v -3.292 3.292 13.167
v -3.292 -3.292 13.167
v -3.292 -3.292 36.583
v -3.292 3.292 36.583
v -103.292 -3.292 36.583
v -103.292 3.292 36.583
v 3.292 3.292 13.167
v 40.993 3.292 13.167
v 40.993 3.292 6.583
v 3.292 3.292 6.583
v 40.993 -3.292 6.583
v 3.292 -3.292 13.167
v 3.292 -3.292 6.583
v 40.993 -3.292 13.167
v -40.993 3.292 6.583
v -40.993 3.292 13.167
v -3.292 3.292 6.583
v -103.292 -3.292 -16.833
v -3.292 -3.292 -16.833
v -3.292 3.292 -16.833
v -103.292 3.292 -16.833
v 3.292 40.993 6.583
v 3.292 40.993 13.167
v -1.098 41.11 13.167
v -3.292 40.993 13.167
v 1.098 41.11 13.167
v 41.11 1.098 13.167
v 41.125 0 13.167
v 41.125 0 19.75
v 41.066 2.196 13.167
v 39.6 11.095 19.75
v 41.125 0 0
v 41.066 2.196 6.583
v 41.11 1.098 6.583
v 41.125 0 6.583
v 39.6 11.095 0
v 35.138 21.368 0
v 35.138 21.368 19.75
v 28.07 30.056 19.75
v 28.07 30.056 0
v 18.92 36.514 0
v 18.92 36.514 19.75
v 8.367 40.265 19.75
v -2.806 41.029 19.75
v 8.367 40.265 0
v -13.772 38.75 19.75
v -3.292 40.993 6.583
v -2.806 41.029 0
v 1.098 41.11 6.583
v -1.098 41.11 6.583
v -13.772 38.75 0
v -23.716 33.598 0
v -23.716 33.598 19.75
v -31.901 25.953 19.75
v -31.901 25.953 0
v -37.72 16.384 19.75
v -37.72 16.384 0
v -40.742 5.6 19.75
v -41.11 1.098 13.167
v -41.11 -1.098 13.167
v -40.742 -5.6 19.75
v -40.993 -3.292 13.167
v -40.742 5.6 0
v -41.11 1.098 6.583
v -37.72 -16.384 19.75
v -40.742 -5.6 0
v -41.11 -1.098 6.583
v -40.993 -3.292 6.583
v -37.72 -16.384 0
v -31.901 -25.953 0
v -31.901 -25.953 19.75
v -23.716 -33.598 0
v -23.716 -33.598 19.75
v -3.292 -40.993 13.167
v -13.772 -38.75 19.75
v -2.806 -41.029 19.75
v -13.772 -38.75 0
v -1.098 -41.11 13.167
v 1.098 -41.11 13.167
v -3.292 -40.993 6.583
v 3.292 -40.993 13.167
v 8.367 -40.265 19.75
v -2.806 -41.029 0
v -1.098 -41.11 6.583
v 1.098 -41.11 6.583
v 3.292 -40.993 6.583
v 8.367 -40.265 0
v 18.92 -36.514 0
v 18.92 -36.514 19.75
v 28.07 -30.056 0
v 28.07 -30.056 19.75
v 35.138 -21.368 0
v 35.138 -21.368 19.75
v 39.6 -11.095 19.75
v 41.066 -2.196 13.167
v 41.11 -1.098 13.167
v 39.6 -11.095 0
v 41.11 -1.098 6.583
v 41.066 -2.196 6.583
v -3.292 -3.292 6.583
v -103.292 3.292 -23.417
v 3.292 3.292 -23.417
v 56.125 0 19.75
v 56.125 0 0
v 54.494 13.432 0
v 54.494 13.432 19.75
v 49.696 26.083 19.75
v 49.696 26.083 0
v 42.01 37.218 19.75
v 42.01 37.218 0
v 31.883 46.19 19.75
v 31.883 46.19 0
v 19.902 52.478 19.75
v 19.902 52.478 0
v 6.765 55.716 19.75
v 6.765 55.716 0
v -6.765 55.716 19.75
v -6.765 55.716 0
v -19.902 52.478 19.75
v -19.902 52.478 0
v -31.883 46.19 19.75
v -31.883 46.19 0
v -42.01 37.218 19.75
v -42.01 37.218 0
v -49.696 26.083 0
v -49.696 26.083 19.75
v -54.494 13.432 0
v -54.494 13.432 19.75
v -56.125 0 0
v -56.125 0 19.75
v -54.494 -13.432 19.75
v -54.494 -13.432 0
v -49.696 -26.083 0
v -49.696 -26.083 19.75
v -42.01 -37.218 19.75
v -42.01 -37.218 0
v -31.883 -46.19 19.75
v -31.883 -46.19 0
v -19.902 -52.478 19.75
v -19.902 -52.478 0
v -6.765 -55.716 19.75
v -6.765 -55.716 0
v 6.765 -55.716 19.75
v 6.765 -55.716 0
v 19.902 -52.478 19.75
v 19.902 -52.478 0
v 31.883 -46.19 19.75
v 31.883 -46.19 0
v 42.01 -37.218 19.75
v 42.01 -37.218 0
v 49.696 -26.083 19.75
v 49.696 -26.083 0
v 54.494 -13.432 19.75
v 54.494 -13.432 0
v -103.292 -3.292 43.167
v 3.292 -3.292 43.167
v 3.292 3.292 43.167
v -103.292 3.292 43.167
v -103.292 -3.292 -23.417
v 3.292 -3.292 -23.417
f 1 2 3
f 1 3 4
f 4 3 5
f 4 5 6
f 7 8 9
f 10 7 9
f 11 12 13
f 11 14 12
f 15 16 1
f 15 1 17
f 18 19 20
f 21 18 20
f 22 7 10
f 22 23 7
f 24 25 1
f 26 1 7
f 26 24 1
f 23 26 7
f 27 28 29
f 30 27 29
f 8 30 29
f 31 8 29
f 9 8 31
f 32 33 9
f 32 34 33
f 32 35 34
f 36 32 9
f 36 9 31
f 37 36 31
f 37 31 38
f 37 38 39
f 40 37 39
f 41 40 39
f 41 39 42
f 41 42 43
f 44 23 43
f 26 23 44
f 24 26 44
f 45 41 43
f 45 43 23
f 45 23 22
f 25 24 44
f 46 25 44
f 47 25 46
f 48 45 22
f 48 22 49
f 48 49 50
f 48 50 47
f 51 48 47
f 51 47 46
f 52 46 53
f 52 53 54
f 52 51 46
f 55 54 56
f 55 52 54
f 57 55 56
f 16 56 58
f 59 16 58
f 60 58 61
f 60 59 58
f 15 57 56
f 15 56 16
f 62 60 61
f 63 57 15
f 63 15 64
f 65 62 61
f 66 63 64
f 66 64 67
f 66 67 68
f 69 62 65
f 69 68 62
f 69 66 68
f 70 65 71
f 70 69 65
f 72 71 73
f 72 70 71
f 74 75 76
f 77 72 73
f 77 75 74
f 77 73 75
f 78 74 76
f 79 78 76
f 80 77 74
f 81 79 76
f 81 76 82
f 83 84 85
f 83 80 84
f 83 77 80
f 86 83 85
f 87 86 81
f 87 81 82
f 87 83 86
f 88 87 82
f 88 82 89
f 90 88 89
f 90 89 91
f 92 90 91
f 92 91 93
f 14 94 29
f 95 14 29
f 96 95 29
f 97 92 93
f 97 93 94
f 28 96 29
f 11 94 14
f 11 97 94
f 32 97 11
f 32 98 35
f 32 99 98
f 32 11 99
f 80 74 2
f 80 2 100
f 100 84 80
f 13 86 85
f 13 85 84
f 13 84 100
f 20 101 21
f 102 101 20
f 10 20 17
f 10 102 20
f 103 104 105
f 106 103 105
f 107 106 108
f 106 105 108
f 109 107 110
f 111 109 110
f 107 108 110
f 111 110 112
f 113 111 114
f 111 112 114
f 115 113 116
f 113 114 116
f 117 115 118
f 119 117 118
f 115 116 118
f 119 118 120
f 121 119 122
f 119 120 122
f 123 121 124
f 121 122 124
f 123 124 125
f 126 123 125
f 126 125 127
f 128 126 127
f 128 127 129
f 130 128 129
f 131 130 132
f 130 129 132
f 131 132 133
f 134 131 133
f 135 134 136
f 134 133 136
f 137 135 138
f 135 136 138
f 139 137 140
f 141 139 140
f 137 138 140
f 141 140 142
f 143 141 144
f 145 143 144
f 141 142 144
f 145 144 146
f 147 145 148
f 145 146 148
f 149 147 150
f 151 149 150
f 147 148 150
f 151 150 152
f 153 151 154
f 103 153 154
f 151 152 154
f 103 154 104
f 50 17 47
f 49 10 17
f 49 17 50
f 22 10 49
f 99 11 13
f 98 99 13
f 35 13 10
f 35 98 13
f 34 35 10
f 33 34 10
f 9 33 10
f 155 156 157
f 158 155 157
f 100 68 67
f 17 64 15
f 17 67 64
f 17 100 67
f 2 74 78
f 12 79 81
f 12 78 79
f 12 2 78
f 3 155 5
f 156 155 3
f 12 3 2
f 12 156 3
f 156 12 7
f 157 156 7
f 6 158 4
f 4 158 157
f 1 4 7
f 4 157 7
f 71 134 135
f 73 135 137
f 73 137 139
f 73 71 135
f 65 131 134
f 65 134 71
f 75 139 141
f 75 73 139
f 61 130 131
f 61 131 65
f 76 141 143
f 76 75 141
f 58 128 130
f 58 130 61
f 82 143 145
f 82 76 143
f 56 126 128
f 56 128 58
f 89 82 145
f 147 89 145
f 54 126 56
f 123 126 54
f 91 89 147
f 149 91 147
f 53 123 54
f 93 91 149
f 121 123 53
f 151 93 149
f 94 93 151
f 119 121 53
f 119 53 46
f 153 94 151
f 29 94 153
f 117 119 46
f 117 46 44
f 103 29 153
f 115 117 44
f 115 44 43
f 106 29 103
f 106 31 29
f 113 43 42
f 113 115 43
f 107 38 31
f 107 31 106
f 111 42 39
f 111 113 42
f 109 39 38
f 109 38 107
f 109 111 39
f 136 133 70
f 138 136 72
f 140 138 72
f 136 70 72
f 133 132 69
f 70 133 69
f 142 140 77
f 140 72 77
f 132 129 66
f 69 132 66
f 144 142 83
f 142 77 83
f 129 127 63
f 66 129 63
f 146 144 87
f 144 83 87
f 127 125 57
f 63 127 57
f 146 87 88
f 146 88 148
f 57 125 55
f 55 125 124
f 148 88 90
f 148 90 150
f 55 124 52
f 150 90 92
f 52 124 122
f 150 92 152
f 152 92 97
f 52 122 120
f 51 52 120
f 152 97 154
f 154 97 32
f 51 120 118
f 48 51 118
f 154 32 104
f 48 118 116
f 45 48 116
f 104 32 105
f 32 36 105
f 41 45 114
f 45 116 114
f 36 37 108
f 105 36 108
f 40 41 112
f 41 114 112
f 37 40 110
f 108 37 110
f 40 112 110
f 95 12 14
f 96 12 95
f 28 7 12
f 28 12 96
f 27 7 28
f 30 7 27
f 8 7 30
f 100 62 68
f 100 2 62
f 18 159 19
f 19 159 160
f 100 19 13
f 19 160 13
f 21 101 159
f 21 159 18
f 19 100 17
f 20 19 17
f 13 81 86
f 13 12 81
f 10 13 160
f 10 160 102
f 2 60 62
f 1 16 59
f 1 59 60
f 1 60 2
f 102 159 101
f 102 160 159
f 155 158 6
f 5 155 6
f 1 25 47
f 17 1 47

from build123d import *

# Parameters (mm, degrees)
ESQUISSE1_R                         = 56.125
ESQUISSE1_R_2                       = 41.125
BOSS_EXTRU_1_DEPTH                  = 19.75
BOSS_EXTRU_2_REACH                  = 83.793
BOSS_EXTRU_2_END_RADIUS             = 41.125
ESQUISSE2_W                         = 6.583333334
ESQUISSE2_H                         = 6.583333334
BOSS_EXTRU_2_DIRECTION_2_REACH      = 83.793
BOSS_EXTRU_2_DIRECTION_2_END_RADIUS = 41.125
R_P_TITION_CIRCULAIRE1_COUNT        = 2
R_P_TITION_CIRCULAIRE1_ANGLE        = 90
ESQUISSE5_W                         = 6.583333334
ESQUISSE5_H                         = 6.583333334
BOSS_EXTRU_3_DEPTH                  = 30
ESQUISSE6_W                         = 6.583333334
ESQUISSE6_H                         = 6.583333334
BOSS_EXTRU_4_DEPTH                  = 100


with BuildPart() as part:
    # Esquisse1 → Boss.-Extru.1 (new body)
    with BuildSketch(Plane.XY):
        Circle(ESQUISSE1_R)
        Circle(ESQUISSE1_R_2, mode=Mode.SUBTRACT)
    extrude(amount=BOSS_EXTRU_1_DEPTH)

    # Boss.-Extru.2: up to this cylinder (the profile starts inside it)
    boss_extru_2_end = Plane(origin=(0, 0, 9.875), z_dir=(0, 0, -1)) * Cylinder(BOSS_EXTRU_2_END_RADIUS, 250.836, mode=Mode.PRIVATE)
    # Esquisse2 → Boss.-Extru.2 (add, up to the surface)
    with BuildSketch(Plane(origin=(0, 0, 0), x_dir=(0, 0, -1), z_dir=(1, 0, 0)), mode=Mode.PRIVATE) as boss_extru_2_sk1:
        with Locations((-9.875, 0)):
            Rectangle(ESQUISSE2_W, ESQUISSE2_H)
    boss_extru_2_tool1 = extrude(boss_extru_2_sk1.sketch, amount=BOSS_EXTRU_2_REACH, mode=Mode.PRIVATE) & boss_extru_2_end
    boss_extru_2 = boss_extru_2_tool1.solids().sort_by_distance((0, 0, 9.875))[0]
    add(boss_extru_2)

    # Boss.-Extru.2 direction 2: up to this cylinder (the profile starts inside it)
    boss_extru_2_direction_2_end = Plane(origin=(0, 0, 9.875), z_dir=(0, 0, -1)) * Cylinder(BOSS_EXTRU_2_DIRECTION_2_END_RADIUS, 250.836, mode=Mode.PRIVATE)
    # Esquisse2 → Boss.-Extru.2 direction 2 (add, up to the surface)
    with BuildSketch(Plane(origin=(0, 0, 0), x_dir=(0, 0, -1), z_dir=(1, 0, 0)), mode=Mode.PRIVATE) as boss_extru_2_direction_2_sk1:
        with Locations((-9.875, 0)):
            Rectangle(ESQUISSE2_W, ESQUISSE2_H)
    boss_extru_2_direction_2_tool1 = extrude(boss_extru_2_direction_2_sk1.sketch, amount=-BOSS_EXTRU_2_DIRECTION_2_REACH, mode=Mode.PRIVATE) & boss_extru_2_direction_2_end
    boss_extru_2_direction_2 = boss_extru_2_direction_2_tool1.solids().sort_by_distance((0, 0, 9.875))[0]
    add(boss_extru_2_direction_2)
    boss_extru_2 = boss_extru_2 + boss_extru_2_direction_2  # both directions under the feature's name, for the pattern or mirror that repeats it

    # Répétition circulaire1: Boss.-Extru.2 ×2 about axis
    r_p_tition_circulaire1_axis = Axis((0, 0, 32.118593888), (0, 0, -1))
    for i in range(1, R_P_TITION_CIRCULAIRE1_COUNT):
        add(boss_extru_2.rotate(r_p_tition_circulaire1_axis, i * R_P_TITION_CIRCULAIRE1_ANGLE / (R_P_TITION_CIRCULAIRE1_COUNT - 1)))

    # Esquisse5 → Boss.-Extru.3 (add)
    with BuildSketch(Plane(origin=(0, 0, 6.583333333), x_dir=(-1, 0, 0), z_dir=(0, 0, -1))):
        Rectangle(ESQUISSE5_W, ESQUISSE5_H)
    boss_extru_3 = extrude(amount=BOSS_EXTRU_3_DEPTH)

    # Esquisse6 → Boss.-Extru.4 (add)
    with BuildSketch(Plane.ZY.offset(3.291666667)):
        with Locations((-20.125, 0)):
            Rectangle(ESQUISSE6_W, ESQUISSE6_H)
    boss_extru_4 = extrude(amount=BOSS_EXTRU_4_DEPTH)

    # Symétrie1: Boss.-Extru.3, Boss.-Extru.4 across plane
    add(boss_extru_3.mirror(Plane(origin=(0, 0, 9.875), x_dir=(1, 0, 0), z_dir=(0, 0, -1))))
    add(boss_extru_4.mirror(Plane(origin=(0, 0, 9.875), x_dir=(1, 0, 0), z_dir=(0, 0, -1))))


solid = part.part
